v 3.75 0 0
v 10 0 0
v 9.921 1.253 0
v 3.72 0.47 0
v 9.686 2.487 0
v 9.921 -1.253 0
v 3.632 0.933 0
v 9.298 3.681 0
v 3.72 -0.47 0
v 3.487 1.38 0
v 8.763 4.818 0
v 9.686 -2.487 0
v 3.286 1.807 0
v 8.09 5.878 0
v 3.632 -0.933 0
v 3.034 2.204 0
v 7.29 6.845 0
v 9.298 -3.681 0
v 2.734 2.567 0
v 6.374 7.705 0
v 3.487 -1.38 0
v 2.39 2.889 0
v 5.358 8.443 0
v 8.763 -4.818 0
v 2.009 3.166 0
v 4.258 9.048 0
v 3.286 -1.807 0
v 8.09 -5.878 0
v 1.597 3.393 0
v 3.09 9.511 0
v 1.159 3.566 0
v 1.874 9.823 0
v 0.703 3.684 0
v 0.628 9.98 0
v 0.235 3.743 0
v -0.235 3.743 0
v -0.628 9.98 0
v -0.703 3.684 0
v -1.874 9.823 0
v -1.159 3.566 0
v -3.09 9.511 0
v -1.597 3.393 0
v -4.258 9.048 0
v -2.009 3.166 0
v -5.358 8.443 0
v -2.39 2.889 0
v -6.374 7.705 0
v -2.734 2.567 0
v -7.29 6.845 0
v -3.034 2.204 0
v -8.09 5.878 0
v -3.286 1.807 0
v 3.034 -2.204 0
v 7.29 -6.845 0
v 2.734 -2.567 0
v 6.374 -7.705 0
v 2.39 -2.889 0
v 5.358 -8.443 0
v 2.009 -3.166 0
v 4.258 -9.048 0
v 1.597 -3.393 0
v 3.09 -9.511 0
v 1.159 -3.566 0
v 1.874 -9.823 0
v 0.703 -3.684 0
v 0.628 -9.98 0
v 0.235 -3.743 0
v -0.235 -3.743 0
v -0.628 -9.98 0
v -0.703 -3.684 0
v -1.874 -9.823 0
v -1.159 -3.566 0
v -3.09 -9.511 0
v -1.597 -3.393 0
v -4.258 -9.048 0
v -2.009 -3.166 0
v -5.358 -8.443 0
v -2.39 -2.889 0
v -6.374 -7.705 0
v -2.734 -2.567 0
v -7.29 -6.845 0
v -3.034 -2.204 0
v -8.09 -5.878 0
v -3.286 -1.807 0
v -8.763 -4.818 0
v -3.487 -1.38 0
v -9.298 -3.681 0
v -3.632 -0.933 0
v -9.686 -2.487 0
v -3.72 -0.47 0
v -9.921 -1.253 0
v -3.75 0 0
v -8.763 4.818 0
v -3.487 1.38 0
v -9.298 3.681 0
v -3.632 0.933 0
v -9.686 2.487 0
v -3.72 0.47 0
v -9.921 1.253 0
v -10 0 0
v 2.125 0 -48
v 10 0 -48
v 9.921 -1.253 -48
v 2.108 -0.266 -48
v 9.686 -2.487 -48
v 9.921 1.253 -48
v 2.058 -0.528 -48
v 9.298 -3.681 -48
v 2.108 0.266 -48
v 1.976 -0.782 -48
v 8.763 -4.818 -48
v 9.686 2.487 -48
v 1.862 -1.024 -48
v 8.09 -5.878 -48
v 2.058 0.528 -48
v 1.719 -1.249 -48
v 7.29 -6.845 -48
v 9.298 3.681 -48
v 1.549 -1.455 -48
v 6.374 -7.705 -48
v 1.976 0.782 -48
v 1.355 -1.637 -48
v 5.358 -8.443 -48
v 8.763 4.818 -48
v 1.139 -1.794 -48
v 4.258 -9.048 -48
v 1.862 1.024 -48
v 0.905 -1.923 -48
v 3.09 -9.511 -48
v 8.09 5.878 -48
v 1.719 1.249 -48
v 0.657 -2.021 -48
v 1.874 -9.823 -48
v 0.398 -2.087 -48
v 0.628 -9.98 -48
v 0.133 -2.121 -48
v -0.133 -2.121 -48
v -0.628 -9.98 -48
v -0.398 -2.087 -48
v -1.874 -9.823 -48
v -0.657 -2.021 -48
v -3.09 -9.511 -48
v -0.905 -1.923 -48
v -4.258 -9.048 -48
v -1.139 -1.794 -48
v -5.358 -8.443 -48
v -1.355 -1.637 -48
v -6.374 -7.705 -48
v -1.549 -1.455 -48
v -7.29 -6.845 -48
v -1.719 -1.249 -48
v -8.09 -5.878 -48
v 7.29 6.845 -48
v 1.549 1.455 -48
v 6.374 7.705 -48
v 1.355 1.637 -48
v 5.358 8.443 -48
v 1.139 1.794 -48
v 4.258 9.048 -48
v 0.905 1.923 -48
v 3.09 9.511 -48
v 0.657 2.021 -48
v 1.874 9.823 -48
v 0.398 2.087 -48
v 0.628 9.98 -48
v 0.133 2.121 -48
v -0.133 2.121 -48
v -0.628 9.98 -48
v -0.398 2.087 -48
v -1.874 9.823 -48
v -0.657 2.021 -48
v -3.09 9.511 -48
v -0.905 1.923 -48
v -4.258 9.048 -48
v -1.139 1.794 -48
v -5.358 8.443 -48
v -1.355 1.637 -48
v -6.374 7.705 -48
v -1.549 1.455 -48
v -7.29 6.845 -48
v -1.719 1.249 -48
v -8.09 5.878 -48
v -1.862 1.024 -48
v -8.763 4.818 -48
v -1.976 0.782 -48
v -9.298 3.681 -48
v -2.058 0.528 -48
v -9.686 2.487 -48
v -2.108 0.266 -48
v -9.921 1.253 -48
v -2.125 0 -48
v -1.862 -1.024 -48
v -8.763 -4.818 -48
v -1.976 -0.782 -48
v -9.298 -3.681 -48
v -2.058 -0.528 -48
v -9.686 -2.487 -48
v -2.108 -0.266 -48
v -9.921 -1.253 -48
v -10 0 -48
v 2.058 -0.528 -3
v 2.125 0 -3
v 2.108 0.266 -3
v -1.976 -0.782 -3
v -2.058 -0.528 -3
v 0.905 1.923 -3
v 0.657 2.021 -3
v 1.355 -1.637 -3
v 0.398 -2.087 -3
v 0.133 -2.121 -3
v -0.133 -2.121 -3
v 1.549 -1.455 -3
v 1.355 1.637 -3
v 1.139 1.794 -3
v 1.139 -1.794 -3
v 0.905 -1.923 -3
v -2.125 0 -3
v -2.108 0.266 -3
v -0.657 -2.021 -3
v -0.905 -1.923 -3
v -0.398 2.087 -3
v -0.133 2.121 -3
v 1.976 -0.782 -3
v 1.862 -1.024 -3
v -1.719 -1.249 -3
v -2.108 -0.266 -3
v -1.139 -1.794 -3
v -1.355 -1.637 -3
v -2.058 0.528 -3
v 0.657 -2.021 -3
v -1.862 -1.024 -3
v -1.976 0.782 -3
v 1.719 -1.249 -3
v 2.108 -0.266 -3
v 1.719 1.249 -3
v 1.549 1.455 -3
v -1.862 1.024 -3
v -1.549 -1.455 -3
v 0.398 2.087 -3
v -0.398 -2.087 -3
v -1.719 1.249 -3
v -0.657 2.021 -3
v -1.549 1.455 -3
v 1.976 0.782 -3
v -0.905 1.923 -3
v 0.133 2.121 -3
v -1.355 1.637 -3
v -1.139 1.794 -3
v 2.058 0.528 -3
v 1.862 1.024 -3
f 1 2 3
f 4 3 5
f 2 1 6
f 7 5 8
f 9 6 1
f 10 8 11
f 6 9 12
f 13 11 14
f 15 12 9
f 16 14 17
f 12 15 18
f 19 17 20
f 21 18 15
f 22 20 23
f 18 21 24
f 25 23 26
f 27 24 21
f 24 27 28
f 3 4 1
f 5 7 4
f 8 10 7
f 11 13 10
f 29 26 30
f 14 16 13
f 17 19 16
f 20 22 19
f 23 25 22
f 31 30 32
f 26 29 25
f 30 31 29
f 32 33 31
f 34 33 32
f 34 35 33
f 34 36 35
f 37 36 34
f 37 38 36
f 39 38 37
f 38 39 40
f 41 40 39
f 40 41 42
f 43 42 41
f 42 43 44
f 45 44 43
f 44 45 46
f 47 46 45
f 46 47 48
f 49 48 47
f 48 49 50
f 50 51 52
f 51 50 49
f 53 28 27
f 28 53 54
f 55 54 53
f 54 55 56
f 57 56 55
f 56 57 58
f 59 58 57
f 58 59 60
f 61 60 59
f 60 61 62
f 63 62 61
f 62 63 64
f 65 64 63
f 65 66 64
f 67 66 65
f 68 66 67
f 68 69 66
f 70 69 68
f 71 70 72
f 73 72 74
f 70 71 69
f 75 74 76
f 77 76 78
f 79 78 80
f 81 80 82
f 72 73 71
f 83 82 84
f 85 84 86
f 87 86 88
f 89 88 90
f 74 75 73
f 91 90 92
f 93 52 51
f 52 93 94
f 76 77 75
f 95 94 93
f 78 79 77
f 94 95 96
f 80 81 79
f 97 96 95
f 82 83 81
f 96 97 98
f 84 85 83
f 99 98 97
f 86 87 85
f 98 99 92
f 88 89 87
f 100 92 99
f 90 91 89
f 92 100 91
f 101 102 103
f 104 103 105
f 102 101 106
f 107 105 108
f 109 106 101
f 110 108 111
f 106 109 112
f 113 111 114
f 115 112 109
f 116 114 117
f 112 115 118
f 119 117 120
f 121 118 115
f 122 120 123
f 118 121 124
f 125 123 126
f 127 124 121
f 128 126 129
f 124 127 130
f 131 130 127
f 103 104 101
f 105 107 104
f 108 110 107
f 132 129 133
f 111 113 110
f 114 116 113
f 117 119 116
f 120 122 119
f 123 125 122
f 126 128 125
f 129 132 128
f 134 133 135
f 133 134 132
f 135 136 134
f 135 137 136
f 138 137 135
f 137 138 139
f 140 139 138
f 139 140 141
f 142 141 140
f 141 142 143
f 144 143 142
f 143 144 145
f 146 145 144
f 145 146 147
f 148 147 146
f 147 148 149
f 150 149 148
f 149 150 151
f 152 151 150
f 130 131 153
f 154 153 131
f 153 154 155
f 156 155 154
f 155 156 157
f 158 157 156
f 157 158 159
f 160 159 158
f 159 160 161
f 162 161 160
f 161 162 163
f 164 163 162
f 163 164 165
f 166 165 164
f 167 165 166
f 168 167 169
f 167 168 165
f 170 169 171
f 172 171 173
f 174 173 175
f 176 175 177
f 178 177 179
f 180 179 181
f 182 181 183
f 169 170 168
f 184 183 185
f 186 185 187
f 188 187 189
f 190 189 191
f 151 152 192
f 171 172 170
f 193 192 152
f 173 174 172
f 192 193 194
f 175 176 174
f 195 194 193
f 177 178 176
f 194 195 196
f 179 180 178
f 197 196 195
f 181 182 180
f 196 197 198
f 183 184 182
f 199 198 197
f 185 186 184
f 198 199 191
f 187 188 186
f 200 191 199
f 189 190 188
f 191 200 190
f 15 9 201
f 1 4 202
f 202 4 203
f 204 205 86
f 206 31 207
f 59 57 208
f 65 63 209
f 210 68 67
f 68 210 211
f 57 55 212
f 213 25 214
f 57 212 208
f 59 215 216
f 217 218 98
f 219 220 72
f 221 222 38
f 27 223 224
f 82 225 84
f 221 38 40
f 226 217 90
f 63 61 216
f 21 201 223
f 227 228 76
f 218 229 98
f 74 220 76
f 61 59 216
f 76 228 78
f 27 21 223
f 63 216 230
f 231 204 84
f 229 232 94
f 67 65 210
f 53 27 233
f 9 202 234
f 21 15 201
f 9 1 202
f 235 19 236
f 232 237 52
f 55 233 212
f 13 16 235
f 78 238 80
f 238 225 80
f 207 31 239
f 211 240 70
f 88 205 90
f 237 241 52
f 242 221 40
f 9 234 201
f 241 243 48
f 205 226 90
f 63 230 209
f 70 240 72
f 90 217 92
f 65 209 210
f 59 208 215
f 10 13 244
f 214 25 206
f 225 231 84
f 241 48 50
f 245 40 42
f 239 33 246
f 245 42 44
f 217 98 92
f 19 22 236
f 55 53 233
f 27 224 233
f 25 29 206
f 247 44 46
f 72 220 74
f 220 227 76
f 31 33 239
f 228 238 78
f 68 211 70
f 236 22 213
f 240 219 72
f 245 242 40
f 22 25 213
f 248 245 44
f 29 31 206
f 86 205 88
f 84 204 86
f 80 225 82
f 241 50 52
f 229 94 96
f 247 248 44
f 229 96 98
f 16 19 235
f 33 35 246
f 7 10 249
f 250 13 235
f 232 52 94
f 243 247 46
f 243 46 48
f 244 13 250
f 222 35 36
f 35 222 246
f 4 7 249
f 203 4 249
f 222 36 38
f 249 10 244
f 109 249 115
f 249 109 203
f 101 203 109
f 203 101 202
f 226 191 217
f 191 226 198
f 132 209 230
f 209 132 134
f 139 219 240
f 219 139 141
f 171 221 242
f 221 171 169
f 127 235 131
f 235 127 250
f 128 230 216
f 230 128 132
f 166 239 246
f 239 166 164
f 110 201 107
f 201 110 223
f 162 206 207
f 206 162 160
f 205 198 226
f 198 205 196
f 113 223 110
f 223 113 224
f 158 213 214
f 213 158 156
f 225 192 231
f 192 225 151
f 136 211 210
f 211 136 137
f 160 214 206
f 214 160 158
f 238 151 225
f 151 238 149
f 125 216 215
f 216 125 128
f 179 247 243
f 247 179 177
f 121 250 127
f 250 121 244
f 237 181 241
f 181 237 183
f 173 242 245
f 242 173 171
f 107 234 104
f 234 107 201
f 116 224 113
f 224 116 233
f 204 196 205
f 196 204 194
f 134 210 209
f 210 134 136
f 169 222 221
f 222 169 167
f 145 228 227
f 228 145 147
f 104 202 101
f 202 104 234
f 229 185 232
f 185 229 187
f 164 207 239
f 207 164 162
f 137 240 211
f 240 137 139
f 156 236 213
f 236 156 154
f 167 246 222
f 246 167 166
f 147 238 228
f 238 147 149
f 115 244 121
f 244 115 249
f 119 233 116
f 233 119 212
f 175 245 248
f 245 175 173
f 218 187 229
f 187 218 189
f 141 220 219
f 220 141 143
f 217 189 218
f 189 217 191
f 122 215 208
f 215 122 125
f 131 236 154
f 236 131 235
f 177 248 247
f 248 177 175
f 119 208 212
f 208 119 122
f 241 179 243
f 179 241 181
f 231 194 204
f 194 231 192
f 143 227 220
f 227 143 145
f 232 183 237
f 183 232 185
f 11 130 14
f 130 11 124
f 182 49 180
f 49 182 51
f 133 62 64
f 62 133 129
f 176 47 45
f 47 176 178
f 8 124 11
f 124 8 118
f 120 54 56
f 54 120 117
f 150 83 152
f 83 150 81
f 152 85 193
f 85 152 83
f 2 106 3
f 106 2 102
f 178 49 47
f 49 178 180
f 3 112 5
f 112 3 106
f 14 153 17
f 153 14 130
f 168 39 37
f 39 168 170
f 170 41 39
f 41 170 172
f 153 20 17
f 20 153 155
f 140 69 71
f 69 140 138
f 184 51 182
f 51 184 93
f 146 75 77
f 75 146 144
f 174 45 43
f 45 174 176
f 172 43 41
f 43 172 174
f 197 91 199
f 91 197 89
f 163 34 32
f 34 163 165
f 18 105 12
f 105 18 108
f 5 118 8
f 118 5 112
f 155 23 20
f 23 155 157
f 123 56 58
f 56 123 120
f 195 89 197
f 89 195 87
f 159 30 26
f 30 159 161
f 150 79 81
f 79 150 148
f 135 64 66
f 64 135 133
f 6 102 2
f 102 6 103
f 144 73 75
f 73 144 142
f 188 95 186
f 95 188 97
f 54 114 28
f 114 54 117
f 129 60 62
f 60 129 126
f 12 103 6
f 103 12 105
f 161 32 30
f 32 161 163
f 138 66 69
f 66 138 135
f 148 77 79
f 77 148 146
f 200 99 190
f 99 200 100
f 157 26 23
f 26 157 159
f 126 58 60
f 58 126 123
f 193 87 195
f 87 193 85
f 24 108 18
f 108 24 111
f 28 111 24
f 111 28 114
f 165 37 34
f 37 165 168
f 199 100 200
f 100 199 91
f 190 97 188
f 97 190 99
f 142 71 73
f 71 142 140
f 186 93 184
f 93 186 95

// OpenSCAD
$fn = 50;


difference() {
	union() {
		translate(v = [0, 0, -48.0000000000]) {
			cylinder(h = 48, r = 10.0000000000);
		}
		cylinder(h = 0, r = 20.0000000000);
	}
	union() {
		translate(v = [0, 0, 0]) {
			rotate(a = [0, 0, 0]) {
				difference() {
					union() {
						#translate(v = [0, 0, -48.0000000000]) {
							cylinder(h = 48, r = 2.0000000000);
						}
						#translate(v = [0, 0, -3]) {
							cylinder(h = 3, r1 = 2.1250000000, r2 = 3.7500000000);
						}
						#translate(v = [0, 0, -48.0000000000]) {
							cylinder(h = 48, r = 2.1250000000);
						}
						#translate(v = [0, 0, -48.0000000000]) {
							cylinder(h = 48, r = 2.0000000000);
						}
					}
					union();
				}
			}
		}
	}
}
